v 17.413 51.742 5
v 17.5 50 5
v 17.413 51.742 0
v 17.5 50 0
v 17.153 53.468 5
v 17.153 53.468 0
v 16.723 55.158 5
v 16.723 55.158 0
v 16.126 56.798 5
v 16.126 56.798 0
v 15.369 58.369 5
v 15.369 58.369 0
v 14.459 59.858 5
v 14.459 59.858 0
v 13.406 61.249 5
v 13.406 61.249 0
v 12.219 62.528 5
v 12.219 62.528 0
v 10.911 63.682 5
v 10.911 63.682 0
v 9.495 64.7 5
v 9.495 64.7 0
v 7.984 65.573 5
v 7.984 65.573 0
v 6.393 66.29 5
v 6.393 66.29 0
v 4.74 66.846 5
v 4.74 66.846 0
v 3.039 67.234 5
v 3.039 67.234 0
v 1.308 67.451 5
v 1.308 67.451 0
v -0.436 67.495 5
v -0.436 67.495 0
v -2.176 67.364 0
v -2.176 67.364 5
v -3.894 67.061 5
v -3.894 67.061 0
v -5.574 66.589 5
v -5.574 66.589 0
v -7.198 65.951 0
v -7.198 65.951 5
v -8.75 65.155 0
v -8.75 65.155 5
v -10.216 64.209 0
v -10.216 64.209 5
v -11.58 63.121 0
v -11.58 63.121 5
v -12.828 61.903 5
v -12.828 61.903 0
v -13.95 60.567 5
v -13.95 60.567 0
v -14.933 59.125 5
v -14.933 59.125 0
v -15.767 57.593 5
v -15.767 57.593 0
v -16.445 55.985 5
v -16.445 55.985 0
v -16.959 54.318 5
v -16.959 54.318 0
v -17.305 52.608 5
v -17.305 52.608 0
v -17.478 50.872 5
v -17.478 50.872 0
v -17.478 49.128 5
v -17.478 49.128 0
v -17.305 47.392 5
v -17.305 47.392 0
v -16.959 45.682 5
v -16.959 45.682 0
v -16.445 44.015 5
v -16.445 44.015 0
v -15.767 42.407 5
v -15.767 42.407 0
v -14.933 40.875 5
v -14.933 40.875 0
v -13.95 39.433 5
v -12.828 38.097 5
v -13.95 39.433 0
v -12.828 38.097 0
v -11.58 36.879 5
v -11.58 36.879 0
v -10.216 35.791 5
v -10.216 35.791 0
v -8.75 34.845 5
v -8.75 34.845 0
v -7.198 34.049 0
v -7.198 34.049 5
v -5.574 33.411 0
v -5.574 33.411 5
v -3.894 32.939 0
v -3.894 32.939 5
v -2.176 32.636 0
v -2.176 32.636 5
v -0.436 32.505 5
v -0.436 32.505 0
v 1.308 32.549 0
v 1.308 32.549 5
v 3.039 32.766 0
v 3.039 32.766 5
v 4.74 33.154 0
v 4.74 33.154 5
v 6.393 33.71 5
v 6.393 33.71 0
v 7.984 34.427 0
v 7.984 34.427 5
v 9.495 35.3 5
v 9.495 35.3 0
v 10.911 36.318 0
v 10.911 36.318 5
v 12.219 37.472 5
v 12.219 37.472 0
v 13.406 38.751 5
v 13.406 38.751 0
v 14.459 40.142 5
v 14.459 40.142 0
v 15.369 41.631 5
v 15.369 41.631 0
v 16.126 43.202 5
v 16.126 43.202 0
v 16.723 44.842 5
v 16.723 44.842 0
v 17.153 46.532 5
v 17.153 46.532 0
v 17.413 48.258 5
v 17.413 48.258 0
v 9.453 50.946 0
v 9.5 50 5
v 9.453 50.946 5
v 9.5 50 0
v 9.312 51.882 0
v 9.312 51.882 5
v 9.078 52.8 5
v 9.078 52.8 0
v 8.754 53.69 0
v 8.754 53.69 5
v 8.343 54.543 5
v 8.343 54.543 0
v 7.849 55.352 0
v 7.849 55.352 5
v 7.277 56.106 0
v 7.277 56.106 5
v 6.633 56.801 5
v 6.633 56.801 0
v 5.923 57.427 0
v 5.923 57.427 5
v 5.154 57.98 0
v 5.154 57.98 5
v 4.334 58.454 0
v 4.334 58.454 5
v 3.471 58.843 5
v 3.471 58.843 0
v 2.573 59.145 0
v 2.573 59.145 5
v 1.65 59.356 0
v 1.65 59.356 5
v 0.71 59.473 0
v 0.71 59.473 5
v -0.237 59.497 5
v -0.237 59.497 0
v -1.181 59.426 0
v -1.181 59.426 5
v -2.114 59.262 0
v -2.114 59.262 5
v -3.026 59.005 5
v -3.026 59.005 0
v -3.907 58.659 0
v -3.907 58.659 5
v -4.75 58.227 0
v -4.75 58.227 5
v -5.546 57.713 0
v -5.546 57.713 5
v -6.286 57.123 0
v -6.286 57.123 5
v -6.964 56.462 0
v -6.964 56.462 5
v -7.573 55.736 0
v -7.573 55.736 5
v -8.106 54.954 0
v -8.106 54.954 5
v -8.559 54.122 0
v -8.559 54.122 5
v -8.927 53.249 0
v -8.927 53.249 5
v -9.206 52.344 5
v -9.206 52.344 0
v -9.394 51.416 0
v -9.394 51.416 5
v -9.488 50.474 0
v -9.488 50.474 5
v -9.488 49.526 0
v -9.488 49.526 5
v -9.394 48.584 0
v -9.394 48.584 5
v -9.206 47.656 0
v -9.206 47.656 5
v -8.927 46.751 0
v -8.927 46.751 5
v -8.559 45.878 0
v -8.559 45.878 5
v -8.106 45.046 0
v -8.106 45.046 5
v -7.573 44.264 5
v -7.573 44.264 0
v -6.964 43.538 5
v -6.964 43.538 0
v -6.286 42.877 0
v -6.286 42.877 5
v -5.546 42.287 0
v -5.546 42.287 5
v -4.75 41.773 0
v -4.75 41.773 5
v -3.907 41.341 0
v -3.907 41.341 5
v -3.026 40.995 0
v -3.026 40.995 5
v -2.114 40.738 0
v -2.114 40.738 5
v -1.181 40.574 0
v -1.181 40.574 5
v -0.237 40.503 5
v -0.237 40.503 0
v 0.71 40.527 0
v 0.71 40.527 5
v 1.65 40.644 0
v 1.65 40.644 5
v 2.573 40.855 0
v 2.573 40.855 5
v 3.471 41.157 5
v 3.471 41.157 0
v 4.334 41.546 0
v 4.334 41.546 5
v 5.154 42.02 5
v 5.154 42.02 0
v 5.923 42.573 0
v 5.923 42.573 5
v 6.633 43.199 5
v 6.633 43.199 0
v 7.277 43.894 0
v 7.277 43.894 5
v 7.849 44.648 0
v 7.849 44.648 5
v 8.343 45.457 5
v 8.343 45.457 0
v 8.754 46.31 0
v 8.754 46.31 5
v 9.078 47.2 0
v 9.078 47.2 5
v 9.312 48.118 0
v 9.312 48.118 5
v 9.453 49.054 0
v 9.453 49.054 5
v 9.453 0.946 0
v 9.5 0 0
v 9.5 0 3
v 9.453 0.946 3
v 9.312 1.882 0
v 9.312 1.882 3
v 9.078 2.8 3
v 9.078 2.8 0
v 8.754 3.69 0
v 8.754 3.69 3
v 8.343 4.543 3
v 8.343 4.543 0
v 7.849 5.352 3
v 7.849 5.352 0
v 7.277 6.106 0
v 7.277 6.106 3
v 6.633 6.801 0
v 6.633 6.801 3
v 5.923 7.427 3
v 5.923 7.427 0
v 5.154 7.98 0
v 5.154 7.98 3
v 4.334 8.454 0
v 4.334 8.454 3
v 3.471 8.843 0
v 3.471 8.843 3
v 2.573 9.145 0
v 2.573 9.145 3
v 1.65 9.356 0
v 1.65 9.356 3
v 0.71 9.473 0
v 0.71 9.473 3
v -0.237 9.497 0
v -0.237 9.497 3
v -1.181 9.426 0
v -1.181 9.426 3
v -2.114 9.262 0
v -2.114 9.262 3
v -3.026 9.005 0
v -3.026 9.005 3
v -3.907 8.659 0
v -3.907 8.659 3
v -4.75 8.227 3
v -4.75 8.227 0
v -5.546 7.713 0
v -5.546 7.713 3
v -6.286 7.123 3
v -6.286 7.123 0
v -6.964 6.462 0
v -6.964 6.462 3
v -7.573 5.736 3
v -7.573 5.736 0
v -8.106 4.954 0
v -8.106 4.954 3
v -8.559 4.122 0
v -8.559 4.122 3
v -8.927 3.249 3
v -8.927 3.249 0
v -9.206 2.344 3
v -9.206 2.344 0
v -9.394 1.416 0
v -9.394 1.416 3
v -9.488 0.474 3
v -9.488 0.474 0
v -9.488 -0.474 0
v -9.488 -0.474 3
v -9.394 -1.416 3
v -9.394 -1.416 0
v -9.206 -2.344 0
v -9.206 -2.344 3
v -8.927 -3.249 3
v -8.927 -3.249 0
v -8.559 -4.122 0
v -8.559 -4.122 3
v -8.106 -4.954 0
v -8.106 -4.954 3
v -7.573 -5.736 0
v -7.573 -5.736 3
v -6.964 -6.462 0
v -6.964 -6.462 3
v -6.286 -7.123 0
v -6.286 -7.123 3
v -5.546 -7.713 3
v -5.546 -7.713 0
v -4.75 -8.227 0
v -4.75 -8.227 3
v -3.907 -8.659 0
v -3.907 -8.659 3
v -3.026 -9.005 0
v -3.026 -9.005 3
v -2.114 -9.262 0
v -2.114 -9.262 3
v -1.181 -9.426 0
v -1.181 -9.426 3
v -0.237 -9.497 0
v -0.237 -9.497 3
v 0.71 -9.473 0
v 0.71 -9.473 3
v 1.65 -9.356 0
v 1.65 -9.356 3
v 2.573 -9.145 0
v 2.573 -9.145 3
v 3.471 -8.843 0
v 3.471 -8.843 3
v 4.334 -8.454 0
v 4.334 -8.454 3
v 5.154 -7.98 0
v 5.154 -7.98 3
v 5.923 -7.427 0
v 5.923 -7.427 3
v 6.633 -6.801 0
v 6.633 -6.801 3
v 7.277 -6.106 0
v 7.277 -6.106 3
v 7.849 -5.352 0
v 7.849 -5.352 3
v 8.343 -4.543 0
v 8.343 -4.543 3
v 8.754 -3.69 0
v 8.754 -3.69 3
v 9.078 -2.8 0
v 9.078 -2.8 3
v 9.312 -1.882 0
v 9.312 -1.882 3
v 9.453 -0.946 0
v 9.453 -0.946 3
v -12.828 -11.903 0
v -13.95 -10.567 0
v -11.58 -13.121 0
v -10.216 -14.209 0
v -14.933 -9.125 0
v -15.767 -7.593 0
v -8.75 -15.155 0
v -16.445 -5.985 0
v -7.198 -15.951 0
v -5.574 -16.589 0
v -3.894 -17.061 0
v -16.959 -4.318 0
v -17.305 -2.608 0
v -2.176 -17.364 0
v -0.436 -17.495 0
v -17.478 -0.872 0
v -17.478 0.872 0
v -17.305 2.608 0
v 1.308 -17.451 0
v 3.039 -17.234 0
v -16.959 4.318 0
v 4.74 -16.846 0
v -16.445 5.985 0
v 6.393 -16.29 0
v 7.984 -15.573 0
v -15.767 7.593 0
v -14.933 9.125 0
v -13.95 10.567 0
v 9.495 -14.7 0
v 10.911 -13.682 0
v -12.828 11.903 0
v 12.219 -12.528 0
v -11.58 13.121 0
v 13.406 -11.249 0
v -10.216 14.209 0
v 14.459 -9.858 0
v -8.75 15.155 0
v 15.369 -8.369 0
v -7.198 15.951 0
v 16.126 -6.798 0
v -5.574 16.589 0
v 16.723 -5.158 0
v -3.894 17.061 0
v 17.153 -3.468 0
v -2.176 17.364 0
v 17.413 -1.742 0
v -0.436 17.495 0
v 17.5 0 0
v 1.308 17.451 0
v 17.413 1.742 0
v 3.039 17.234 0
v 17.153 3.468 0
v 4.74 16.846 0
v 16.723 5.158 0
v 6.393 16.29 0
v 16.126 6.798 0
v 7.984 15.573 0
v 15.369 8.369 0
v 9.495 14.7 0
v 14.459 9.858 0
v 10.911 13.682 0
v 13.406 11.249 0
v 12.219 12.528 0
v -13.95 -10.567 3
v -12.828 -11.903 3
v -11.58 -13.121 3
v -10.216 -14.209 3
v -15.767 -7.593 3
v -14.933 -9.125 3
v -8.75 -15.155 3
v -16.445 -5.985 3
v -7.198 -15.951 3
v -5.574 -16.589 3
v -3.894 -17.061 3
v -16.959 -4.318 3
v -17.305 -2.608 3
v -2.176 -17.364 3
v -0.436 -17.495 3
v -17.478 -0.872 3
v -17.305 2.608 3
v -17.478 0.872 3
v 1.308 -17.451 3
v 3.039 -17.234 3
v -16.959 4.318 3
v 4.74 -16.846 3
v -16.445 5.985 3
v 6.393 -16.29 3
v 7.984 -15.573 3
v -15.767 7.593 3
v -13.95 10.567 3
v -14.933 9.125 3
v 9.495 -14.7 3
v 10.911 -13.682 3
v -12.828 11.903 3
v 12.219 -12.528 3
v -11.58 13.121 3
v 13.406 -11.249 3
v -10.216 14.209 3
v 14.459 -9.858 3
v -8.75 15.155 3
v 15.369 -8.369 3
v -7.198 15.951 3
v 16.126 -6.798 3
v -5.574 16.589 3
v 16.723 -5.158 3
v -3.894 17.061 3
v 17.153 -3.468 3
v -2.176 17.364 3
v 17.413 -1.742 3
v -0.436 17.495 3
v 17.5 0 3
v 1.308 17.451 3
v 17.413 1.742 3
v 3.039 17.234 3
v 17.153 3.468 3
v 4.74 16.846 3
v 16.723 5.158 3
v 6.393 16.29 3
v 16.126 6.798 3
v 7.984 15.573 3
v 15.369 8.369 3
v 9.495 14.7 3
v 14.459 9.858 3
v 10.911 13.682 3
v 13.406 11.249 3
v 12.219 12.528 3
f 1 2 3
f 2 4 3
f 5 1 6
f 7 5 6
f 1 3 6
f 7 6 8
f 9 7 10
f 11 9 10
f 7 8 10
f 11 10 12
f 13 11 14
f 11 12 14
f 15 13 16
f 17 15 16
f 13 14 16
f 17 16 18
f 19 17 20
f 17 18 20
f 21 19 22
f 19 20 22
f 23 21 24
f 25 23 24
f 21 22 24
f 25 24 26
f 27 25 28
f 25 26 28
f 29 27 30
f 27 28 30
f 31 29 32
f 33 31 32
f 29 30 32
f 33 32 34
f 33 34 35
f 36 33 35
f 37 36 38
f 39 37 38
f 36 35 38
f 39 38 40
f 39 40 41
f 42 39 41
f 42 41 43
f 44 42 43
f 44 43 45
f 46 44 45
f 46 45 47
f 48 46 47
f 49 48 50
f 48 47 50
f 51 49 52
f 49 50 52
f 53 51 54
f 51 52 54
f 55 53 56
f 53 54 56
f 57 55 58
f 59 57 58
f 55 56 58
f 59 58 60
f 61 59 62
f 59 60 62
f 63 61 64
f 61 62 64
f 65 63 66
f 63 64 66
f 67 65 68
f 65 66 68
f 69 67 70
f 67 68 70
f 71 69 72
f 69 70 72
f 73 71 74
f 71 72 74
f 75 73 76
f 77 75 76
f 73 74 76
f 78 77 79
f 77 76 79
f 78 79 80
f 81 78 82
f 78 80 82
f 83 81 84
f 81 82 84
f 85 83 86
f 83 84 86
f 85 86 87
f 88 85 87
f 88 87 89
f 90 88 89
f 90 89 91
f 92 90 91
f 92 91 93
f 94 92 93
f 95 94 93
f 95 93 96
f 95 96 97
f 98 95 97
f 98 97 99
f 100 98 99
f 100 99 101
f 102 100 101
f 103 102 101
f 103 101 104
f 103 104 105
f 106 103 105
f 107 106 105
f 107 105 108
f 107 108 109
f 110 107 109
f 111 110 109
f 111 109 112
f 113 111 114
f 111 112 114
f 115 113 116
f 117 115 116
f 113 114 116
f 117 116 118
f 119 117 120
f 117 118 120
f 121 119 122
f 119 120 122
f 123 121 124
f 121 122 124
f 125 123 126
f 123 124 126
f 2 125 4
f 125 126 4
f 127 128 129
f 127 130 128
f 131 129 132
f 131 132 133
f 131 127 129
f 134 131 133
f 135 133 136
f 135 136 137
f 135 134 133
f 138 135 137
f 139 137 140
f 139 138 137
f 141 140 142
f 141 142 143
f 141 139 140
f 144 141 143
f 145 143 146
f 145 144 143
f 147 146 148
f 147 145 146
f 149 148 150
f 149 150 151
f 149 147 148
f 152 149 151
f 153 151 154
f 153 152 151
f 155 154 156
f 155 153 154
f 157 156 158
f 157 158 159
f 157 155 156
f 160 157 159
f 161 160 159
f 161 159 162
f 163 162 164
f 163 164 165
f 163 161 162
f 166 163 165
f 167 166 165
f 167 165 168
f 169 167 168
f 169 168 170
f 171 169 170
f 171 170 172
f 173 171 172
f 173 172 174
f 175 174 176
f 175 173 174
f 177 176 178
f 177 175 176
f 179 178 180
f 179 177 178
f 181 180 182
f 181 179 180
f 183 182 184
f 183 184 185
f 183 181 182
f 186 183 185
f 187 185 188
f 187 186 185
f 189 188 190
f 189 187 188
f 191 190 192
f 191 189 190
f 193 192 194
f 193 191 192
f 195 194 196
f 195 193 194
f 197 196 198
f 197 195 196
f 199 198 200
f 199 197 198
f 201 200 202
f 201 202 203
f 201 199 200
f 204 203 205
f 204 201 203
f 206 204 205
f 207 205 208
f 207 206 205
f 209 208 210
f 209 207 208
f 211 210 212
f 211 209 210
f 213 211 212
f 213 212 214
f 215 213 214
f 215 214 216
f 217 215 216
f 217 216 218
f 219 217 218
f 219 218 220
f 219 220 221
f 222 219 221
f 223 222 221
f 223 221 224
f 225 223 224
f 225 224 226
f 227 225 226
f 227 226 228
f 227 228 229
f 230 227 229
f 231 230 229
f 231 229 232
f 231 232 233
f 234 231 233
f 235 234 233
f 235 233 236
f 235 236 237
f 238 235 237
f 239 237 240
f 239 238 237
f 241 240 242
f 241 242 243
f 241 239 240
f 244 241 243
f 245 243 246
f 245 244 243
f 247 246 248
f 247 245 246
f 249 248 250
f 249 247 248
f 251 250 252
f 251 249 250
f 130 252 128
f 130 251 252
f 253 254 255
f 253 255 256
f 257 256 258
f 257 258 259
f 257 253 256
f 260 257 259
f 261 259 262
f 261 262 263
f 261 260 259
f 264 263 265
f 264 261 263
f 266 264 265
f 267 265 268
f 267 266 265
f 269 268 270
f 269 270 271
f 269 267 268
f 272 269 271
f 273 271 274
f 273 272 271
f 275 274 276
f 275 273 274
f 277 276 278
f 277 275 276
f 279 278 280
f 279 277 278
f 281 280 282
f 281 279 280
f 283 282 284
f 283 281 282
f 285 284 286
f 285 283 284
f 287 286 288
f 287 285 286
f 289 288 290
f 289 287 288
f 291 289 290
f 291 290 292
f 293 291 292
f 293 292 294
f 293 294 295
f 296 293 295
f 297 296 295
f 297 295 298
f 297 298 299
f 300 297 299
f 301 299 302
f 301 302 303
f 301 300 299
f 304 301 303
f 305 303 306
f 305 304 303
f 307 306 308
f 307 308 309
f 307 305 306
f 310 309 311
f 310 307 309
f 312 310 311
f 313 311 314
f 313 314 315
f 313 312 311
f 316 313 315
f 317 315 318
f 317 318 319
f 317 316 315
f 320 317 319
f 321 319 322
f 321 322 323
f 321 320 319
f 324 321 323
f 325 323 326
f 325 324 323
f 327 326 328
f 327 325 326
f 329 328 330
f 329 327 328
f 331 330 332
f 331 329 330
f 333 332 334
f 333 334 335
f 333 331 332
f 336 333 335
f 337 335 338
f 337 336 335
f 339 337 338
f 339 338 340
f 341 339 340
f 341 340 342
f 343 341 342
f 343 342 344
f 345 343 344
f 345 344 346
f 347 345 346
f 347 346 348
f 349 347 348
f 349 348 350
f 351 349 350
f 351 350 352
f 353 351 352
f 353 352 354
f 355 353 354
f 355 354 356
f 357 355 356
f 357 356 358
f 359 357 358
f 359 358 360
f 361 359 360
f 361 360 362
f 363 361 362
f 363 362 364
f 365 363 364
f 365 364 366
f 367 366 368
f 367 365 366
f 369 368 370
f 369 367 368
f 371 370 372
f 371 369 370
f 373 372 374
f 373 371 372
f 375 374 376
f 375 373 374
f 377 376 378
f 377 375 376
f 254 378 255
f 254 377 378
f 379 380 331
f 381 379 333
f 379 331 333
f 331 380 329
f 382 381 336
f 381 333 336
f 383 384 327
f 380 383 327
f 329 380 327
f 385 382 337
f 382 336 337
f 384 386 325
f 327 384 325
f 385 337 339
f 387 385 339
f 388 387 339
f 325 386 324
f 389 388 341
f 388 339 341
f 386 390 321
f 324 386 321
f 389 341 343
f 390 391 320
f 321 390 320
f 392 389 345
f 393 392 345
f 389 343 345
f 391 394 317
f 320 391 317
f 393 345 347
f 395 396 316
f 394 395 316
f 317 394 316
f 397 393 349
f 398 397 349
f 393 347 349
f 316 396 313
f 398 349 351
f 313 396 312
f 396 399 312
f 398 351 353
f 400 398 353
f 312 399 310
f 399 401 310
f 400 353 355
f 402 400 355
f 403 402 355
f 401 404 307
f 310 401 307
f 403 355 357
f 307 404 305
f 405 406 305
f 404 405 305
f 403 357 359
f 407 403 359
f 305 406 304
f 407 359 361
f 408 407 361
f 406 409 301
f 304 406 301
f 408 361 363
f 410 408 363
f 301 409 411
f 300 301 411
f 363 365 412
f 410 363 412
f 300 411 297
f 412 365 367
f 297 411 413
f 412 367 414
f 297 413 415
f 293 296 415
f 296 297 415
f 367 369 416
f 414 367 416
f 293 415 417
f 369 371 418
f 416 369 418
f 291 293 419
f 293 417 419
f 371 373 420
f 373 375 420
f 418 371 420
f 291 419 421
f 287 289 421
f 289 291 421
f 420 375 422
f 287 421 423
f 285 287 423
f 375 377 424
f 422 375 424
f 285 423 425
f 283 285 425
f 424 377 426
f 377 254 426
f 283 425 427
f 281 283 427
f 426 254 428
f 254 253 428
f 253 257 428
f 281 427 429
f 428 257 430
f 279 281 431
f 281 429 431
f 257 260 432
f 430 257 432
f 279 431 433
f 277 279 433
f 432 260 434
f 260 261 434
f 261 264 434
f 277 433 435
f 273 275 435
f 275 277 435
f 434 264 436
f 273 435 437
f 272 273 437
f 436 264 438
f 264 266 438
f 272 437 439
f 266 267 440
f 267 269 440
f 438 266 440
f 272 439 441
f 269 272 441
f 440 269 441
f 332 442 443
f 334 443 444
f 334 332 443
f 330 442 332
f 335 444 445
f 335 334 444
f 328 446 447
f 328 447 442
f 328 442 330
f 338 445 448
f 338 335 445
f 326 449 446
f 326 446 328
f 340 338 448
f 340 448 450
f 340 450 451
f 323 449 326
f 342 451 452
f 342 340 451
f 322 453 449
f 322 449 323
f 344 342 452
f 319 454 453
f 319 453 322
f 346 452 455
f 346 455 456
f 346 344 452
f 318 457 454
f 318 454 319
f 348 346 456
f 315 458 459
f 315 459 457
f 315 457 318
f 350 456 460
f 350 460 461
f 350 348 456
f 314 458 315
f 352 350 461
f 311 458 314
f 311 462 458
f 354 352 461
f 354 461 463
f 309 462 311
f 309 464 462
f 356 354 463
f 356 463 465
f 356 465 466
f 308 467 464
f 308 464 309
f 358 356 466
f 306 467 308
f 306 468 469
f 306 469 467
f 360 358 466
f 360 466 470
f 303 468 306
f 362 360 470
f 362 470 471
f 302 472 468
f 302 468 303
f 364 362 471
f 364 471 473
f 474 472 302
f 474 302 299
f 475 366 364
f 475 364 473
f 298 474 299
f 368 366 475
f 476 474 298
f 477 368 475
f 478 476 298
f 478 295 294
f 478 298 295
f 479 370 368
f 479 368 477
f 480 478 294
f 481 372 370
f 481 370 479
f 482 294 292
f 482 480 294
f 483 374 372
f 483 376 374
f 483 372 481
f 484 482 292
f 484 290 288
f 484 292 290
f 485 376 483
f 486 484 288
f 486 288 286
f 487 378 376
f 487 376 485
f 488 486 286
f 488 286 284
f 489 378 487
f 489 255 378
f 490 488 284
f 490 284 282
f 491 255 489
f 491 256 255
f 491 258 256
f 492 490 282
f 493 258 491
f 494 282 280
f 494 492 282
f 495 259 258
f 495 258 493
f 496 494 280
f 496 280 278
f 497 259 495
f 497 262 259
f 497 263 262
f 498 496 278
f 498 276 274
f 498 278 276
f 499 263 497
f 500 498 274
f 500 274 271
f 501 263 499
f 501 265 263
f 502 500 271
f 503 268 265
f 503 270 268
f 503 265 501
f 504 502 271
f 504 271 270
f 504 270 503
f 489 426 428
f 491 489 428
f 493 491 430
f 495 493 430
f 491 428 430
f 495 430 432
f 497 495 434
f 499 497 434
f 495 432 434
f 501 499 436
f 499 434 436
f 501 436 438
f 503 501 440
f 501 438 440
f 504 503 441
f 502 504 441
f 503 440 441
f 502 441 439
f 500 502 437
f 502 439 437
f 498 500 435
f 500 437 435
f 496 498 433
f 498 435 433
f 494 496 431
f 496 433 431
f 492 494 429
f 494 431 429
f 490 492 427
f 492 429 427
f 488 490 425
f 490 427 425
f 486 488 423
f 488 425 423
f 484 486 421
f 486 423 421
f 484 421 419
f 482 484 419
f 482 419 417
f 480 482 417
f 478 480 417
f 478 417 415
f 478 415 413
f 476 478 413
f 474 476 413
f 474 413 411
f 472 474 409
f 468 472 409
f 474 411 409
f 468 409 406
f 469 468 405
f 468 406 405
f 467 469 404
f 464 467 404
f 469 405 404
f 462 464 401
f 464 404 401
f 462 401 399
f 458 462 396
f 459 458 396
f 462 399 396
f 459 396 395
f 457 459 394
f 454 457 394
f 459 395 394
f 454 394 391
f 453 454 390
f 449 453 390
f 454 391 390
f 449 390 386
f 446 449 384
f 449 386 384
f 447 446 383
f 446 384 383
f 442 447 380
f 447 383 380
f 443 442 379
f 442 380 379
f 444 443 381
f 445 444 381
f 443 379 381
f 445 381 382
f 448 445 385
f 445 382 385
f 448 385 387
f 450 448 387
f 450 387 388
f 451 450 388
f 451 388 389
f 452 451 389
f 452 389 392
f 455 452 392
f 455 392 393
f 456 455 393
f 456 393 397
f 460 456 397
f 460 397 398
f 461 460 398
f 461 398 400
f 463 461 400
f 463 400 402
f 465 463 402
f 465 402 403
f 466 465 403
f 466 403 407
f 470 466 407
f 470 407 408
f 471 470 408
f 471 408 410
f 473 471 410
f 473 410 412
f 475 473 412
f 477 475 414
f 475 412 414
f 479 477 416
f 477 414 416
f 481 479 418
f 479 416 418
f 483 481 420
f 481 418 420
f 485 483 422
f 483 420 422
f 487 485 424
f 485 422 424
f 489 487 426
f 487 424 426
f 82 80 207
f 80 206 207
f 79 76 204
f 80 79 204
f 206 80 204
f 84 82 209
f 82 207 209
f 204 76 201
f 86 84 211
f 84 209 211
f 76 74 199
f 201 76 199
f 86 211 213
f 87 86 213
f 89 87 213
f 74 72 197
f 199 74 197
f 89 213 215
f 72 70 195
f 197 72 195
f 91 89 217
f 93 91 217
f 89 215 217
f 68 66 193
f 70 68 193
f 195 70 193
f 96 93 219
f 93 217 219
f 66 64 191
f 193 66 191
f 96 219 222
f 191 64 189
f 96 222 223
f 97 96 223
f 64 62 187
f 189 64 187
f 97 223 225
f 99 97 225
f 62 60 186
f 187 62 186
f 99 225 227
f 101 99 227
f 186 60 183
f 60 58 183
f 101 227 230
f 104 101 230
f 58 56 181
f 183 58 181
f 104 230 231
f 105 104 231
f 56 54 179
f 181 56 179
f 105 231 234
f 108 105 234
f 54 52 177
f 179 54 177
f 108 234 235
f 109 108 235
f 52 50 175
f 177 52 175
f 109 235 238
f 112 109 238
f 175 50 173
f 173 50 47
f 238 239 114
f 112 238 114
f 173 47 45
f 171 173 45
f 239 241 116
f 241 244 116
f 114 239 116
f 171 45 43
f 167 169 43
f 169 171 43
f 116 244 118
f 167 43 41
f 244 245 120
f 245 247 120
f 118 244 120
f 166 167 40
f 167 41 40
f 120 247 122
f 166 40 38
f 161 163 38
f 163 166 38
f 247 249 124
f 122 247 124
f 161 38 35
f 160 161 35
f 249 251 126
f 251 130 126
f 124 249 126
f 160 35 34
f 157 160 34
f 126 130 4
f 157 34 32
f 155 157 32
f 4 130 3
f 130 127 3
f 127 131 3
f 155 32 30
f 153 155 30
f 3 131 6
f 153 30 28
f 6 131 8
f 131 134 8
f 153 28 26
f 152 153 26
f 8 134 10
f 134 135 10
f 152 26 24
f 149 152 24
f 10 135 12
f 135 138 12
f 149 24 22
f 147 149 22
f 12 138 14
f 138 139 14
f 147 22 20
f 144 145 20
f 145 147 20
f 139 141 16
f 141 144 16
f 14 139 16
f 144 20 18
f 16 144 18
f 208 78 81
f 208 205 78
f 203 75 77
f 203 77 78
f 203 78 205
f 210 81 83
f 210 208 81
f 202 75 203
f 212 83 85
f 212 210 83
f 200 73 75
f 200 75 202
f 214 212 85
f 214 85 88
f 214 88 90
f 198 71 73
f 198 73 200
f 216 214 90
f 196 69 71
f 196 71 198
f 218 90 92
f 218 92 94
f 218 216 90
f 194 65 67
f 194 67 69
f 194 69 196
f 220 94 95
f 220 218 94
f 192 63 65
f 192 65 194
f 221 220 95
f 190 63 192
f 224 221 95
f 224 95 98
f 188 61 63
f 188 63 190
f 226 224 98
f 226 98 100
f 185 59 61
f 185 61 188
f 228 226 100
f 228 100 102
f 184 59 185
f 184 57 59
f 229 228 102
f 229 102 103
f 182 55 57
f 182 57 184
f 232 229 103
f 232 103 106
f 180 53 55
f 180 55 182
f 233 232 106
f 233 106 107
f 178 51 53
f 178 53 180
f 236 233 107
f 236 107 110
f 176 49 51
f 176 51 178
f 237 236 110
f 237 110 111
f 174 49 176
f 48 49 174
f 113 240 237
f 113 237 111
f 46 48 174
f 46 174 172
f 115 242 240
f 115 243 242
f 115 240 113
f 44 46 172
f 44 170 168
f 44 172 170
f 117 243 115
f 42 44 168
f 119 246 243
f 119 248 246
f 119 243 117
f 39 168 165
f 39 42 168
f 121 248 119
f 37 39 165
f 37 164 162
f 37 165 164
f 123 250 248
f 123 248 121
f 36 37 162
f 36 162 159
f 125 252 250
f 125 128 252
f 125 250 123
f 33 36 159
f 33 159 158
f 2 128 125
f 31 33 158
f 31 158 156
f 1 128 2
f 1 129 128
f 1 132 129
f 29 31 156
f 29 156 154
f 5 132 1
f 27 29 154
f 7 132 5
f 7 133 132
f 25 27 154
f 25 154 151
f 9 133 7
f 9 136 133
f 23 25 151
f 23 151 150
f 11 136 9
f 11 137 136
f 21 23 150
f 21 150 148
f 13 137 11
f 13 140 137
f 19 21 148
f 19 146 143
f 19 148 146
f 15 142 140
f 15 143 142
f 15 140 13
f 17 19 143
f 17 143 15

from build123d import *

# Parameters (mm, degrees)
F0_R     = 17.5
F0_R_2   = 9.5
F1_DEPTH = 3
F3_DEPTH = 2


with BuildPart() as f1:
    # F0 (on Top) → F1 (new body)
    with BuildSketch(Plane.XY):
        Circle(F0_R)
        Circle(F0_R_2, mode=Mode.SUBTRACT)
    extrude(amount=F1_DEPTH)


with BuildPart() as f2_1:
    # F2: copy of F1
    add(f1.part.moved(Location((0, 50, 0))))

    # F3 (add): a face of the model
    f3_faces = [f2_1.faces().sort_by_distance(p)[0] for p in [
        (-17.0050252532, 50, 3),
    ]]
    extrude(f3_faces, amount=F3_DEPTH)


solid = Compound([f1.part, f2_1.part])
